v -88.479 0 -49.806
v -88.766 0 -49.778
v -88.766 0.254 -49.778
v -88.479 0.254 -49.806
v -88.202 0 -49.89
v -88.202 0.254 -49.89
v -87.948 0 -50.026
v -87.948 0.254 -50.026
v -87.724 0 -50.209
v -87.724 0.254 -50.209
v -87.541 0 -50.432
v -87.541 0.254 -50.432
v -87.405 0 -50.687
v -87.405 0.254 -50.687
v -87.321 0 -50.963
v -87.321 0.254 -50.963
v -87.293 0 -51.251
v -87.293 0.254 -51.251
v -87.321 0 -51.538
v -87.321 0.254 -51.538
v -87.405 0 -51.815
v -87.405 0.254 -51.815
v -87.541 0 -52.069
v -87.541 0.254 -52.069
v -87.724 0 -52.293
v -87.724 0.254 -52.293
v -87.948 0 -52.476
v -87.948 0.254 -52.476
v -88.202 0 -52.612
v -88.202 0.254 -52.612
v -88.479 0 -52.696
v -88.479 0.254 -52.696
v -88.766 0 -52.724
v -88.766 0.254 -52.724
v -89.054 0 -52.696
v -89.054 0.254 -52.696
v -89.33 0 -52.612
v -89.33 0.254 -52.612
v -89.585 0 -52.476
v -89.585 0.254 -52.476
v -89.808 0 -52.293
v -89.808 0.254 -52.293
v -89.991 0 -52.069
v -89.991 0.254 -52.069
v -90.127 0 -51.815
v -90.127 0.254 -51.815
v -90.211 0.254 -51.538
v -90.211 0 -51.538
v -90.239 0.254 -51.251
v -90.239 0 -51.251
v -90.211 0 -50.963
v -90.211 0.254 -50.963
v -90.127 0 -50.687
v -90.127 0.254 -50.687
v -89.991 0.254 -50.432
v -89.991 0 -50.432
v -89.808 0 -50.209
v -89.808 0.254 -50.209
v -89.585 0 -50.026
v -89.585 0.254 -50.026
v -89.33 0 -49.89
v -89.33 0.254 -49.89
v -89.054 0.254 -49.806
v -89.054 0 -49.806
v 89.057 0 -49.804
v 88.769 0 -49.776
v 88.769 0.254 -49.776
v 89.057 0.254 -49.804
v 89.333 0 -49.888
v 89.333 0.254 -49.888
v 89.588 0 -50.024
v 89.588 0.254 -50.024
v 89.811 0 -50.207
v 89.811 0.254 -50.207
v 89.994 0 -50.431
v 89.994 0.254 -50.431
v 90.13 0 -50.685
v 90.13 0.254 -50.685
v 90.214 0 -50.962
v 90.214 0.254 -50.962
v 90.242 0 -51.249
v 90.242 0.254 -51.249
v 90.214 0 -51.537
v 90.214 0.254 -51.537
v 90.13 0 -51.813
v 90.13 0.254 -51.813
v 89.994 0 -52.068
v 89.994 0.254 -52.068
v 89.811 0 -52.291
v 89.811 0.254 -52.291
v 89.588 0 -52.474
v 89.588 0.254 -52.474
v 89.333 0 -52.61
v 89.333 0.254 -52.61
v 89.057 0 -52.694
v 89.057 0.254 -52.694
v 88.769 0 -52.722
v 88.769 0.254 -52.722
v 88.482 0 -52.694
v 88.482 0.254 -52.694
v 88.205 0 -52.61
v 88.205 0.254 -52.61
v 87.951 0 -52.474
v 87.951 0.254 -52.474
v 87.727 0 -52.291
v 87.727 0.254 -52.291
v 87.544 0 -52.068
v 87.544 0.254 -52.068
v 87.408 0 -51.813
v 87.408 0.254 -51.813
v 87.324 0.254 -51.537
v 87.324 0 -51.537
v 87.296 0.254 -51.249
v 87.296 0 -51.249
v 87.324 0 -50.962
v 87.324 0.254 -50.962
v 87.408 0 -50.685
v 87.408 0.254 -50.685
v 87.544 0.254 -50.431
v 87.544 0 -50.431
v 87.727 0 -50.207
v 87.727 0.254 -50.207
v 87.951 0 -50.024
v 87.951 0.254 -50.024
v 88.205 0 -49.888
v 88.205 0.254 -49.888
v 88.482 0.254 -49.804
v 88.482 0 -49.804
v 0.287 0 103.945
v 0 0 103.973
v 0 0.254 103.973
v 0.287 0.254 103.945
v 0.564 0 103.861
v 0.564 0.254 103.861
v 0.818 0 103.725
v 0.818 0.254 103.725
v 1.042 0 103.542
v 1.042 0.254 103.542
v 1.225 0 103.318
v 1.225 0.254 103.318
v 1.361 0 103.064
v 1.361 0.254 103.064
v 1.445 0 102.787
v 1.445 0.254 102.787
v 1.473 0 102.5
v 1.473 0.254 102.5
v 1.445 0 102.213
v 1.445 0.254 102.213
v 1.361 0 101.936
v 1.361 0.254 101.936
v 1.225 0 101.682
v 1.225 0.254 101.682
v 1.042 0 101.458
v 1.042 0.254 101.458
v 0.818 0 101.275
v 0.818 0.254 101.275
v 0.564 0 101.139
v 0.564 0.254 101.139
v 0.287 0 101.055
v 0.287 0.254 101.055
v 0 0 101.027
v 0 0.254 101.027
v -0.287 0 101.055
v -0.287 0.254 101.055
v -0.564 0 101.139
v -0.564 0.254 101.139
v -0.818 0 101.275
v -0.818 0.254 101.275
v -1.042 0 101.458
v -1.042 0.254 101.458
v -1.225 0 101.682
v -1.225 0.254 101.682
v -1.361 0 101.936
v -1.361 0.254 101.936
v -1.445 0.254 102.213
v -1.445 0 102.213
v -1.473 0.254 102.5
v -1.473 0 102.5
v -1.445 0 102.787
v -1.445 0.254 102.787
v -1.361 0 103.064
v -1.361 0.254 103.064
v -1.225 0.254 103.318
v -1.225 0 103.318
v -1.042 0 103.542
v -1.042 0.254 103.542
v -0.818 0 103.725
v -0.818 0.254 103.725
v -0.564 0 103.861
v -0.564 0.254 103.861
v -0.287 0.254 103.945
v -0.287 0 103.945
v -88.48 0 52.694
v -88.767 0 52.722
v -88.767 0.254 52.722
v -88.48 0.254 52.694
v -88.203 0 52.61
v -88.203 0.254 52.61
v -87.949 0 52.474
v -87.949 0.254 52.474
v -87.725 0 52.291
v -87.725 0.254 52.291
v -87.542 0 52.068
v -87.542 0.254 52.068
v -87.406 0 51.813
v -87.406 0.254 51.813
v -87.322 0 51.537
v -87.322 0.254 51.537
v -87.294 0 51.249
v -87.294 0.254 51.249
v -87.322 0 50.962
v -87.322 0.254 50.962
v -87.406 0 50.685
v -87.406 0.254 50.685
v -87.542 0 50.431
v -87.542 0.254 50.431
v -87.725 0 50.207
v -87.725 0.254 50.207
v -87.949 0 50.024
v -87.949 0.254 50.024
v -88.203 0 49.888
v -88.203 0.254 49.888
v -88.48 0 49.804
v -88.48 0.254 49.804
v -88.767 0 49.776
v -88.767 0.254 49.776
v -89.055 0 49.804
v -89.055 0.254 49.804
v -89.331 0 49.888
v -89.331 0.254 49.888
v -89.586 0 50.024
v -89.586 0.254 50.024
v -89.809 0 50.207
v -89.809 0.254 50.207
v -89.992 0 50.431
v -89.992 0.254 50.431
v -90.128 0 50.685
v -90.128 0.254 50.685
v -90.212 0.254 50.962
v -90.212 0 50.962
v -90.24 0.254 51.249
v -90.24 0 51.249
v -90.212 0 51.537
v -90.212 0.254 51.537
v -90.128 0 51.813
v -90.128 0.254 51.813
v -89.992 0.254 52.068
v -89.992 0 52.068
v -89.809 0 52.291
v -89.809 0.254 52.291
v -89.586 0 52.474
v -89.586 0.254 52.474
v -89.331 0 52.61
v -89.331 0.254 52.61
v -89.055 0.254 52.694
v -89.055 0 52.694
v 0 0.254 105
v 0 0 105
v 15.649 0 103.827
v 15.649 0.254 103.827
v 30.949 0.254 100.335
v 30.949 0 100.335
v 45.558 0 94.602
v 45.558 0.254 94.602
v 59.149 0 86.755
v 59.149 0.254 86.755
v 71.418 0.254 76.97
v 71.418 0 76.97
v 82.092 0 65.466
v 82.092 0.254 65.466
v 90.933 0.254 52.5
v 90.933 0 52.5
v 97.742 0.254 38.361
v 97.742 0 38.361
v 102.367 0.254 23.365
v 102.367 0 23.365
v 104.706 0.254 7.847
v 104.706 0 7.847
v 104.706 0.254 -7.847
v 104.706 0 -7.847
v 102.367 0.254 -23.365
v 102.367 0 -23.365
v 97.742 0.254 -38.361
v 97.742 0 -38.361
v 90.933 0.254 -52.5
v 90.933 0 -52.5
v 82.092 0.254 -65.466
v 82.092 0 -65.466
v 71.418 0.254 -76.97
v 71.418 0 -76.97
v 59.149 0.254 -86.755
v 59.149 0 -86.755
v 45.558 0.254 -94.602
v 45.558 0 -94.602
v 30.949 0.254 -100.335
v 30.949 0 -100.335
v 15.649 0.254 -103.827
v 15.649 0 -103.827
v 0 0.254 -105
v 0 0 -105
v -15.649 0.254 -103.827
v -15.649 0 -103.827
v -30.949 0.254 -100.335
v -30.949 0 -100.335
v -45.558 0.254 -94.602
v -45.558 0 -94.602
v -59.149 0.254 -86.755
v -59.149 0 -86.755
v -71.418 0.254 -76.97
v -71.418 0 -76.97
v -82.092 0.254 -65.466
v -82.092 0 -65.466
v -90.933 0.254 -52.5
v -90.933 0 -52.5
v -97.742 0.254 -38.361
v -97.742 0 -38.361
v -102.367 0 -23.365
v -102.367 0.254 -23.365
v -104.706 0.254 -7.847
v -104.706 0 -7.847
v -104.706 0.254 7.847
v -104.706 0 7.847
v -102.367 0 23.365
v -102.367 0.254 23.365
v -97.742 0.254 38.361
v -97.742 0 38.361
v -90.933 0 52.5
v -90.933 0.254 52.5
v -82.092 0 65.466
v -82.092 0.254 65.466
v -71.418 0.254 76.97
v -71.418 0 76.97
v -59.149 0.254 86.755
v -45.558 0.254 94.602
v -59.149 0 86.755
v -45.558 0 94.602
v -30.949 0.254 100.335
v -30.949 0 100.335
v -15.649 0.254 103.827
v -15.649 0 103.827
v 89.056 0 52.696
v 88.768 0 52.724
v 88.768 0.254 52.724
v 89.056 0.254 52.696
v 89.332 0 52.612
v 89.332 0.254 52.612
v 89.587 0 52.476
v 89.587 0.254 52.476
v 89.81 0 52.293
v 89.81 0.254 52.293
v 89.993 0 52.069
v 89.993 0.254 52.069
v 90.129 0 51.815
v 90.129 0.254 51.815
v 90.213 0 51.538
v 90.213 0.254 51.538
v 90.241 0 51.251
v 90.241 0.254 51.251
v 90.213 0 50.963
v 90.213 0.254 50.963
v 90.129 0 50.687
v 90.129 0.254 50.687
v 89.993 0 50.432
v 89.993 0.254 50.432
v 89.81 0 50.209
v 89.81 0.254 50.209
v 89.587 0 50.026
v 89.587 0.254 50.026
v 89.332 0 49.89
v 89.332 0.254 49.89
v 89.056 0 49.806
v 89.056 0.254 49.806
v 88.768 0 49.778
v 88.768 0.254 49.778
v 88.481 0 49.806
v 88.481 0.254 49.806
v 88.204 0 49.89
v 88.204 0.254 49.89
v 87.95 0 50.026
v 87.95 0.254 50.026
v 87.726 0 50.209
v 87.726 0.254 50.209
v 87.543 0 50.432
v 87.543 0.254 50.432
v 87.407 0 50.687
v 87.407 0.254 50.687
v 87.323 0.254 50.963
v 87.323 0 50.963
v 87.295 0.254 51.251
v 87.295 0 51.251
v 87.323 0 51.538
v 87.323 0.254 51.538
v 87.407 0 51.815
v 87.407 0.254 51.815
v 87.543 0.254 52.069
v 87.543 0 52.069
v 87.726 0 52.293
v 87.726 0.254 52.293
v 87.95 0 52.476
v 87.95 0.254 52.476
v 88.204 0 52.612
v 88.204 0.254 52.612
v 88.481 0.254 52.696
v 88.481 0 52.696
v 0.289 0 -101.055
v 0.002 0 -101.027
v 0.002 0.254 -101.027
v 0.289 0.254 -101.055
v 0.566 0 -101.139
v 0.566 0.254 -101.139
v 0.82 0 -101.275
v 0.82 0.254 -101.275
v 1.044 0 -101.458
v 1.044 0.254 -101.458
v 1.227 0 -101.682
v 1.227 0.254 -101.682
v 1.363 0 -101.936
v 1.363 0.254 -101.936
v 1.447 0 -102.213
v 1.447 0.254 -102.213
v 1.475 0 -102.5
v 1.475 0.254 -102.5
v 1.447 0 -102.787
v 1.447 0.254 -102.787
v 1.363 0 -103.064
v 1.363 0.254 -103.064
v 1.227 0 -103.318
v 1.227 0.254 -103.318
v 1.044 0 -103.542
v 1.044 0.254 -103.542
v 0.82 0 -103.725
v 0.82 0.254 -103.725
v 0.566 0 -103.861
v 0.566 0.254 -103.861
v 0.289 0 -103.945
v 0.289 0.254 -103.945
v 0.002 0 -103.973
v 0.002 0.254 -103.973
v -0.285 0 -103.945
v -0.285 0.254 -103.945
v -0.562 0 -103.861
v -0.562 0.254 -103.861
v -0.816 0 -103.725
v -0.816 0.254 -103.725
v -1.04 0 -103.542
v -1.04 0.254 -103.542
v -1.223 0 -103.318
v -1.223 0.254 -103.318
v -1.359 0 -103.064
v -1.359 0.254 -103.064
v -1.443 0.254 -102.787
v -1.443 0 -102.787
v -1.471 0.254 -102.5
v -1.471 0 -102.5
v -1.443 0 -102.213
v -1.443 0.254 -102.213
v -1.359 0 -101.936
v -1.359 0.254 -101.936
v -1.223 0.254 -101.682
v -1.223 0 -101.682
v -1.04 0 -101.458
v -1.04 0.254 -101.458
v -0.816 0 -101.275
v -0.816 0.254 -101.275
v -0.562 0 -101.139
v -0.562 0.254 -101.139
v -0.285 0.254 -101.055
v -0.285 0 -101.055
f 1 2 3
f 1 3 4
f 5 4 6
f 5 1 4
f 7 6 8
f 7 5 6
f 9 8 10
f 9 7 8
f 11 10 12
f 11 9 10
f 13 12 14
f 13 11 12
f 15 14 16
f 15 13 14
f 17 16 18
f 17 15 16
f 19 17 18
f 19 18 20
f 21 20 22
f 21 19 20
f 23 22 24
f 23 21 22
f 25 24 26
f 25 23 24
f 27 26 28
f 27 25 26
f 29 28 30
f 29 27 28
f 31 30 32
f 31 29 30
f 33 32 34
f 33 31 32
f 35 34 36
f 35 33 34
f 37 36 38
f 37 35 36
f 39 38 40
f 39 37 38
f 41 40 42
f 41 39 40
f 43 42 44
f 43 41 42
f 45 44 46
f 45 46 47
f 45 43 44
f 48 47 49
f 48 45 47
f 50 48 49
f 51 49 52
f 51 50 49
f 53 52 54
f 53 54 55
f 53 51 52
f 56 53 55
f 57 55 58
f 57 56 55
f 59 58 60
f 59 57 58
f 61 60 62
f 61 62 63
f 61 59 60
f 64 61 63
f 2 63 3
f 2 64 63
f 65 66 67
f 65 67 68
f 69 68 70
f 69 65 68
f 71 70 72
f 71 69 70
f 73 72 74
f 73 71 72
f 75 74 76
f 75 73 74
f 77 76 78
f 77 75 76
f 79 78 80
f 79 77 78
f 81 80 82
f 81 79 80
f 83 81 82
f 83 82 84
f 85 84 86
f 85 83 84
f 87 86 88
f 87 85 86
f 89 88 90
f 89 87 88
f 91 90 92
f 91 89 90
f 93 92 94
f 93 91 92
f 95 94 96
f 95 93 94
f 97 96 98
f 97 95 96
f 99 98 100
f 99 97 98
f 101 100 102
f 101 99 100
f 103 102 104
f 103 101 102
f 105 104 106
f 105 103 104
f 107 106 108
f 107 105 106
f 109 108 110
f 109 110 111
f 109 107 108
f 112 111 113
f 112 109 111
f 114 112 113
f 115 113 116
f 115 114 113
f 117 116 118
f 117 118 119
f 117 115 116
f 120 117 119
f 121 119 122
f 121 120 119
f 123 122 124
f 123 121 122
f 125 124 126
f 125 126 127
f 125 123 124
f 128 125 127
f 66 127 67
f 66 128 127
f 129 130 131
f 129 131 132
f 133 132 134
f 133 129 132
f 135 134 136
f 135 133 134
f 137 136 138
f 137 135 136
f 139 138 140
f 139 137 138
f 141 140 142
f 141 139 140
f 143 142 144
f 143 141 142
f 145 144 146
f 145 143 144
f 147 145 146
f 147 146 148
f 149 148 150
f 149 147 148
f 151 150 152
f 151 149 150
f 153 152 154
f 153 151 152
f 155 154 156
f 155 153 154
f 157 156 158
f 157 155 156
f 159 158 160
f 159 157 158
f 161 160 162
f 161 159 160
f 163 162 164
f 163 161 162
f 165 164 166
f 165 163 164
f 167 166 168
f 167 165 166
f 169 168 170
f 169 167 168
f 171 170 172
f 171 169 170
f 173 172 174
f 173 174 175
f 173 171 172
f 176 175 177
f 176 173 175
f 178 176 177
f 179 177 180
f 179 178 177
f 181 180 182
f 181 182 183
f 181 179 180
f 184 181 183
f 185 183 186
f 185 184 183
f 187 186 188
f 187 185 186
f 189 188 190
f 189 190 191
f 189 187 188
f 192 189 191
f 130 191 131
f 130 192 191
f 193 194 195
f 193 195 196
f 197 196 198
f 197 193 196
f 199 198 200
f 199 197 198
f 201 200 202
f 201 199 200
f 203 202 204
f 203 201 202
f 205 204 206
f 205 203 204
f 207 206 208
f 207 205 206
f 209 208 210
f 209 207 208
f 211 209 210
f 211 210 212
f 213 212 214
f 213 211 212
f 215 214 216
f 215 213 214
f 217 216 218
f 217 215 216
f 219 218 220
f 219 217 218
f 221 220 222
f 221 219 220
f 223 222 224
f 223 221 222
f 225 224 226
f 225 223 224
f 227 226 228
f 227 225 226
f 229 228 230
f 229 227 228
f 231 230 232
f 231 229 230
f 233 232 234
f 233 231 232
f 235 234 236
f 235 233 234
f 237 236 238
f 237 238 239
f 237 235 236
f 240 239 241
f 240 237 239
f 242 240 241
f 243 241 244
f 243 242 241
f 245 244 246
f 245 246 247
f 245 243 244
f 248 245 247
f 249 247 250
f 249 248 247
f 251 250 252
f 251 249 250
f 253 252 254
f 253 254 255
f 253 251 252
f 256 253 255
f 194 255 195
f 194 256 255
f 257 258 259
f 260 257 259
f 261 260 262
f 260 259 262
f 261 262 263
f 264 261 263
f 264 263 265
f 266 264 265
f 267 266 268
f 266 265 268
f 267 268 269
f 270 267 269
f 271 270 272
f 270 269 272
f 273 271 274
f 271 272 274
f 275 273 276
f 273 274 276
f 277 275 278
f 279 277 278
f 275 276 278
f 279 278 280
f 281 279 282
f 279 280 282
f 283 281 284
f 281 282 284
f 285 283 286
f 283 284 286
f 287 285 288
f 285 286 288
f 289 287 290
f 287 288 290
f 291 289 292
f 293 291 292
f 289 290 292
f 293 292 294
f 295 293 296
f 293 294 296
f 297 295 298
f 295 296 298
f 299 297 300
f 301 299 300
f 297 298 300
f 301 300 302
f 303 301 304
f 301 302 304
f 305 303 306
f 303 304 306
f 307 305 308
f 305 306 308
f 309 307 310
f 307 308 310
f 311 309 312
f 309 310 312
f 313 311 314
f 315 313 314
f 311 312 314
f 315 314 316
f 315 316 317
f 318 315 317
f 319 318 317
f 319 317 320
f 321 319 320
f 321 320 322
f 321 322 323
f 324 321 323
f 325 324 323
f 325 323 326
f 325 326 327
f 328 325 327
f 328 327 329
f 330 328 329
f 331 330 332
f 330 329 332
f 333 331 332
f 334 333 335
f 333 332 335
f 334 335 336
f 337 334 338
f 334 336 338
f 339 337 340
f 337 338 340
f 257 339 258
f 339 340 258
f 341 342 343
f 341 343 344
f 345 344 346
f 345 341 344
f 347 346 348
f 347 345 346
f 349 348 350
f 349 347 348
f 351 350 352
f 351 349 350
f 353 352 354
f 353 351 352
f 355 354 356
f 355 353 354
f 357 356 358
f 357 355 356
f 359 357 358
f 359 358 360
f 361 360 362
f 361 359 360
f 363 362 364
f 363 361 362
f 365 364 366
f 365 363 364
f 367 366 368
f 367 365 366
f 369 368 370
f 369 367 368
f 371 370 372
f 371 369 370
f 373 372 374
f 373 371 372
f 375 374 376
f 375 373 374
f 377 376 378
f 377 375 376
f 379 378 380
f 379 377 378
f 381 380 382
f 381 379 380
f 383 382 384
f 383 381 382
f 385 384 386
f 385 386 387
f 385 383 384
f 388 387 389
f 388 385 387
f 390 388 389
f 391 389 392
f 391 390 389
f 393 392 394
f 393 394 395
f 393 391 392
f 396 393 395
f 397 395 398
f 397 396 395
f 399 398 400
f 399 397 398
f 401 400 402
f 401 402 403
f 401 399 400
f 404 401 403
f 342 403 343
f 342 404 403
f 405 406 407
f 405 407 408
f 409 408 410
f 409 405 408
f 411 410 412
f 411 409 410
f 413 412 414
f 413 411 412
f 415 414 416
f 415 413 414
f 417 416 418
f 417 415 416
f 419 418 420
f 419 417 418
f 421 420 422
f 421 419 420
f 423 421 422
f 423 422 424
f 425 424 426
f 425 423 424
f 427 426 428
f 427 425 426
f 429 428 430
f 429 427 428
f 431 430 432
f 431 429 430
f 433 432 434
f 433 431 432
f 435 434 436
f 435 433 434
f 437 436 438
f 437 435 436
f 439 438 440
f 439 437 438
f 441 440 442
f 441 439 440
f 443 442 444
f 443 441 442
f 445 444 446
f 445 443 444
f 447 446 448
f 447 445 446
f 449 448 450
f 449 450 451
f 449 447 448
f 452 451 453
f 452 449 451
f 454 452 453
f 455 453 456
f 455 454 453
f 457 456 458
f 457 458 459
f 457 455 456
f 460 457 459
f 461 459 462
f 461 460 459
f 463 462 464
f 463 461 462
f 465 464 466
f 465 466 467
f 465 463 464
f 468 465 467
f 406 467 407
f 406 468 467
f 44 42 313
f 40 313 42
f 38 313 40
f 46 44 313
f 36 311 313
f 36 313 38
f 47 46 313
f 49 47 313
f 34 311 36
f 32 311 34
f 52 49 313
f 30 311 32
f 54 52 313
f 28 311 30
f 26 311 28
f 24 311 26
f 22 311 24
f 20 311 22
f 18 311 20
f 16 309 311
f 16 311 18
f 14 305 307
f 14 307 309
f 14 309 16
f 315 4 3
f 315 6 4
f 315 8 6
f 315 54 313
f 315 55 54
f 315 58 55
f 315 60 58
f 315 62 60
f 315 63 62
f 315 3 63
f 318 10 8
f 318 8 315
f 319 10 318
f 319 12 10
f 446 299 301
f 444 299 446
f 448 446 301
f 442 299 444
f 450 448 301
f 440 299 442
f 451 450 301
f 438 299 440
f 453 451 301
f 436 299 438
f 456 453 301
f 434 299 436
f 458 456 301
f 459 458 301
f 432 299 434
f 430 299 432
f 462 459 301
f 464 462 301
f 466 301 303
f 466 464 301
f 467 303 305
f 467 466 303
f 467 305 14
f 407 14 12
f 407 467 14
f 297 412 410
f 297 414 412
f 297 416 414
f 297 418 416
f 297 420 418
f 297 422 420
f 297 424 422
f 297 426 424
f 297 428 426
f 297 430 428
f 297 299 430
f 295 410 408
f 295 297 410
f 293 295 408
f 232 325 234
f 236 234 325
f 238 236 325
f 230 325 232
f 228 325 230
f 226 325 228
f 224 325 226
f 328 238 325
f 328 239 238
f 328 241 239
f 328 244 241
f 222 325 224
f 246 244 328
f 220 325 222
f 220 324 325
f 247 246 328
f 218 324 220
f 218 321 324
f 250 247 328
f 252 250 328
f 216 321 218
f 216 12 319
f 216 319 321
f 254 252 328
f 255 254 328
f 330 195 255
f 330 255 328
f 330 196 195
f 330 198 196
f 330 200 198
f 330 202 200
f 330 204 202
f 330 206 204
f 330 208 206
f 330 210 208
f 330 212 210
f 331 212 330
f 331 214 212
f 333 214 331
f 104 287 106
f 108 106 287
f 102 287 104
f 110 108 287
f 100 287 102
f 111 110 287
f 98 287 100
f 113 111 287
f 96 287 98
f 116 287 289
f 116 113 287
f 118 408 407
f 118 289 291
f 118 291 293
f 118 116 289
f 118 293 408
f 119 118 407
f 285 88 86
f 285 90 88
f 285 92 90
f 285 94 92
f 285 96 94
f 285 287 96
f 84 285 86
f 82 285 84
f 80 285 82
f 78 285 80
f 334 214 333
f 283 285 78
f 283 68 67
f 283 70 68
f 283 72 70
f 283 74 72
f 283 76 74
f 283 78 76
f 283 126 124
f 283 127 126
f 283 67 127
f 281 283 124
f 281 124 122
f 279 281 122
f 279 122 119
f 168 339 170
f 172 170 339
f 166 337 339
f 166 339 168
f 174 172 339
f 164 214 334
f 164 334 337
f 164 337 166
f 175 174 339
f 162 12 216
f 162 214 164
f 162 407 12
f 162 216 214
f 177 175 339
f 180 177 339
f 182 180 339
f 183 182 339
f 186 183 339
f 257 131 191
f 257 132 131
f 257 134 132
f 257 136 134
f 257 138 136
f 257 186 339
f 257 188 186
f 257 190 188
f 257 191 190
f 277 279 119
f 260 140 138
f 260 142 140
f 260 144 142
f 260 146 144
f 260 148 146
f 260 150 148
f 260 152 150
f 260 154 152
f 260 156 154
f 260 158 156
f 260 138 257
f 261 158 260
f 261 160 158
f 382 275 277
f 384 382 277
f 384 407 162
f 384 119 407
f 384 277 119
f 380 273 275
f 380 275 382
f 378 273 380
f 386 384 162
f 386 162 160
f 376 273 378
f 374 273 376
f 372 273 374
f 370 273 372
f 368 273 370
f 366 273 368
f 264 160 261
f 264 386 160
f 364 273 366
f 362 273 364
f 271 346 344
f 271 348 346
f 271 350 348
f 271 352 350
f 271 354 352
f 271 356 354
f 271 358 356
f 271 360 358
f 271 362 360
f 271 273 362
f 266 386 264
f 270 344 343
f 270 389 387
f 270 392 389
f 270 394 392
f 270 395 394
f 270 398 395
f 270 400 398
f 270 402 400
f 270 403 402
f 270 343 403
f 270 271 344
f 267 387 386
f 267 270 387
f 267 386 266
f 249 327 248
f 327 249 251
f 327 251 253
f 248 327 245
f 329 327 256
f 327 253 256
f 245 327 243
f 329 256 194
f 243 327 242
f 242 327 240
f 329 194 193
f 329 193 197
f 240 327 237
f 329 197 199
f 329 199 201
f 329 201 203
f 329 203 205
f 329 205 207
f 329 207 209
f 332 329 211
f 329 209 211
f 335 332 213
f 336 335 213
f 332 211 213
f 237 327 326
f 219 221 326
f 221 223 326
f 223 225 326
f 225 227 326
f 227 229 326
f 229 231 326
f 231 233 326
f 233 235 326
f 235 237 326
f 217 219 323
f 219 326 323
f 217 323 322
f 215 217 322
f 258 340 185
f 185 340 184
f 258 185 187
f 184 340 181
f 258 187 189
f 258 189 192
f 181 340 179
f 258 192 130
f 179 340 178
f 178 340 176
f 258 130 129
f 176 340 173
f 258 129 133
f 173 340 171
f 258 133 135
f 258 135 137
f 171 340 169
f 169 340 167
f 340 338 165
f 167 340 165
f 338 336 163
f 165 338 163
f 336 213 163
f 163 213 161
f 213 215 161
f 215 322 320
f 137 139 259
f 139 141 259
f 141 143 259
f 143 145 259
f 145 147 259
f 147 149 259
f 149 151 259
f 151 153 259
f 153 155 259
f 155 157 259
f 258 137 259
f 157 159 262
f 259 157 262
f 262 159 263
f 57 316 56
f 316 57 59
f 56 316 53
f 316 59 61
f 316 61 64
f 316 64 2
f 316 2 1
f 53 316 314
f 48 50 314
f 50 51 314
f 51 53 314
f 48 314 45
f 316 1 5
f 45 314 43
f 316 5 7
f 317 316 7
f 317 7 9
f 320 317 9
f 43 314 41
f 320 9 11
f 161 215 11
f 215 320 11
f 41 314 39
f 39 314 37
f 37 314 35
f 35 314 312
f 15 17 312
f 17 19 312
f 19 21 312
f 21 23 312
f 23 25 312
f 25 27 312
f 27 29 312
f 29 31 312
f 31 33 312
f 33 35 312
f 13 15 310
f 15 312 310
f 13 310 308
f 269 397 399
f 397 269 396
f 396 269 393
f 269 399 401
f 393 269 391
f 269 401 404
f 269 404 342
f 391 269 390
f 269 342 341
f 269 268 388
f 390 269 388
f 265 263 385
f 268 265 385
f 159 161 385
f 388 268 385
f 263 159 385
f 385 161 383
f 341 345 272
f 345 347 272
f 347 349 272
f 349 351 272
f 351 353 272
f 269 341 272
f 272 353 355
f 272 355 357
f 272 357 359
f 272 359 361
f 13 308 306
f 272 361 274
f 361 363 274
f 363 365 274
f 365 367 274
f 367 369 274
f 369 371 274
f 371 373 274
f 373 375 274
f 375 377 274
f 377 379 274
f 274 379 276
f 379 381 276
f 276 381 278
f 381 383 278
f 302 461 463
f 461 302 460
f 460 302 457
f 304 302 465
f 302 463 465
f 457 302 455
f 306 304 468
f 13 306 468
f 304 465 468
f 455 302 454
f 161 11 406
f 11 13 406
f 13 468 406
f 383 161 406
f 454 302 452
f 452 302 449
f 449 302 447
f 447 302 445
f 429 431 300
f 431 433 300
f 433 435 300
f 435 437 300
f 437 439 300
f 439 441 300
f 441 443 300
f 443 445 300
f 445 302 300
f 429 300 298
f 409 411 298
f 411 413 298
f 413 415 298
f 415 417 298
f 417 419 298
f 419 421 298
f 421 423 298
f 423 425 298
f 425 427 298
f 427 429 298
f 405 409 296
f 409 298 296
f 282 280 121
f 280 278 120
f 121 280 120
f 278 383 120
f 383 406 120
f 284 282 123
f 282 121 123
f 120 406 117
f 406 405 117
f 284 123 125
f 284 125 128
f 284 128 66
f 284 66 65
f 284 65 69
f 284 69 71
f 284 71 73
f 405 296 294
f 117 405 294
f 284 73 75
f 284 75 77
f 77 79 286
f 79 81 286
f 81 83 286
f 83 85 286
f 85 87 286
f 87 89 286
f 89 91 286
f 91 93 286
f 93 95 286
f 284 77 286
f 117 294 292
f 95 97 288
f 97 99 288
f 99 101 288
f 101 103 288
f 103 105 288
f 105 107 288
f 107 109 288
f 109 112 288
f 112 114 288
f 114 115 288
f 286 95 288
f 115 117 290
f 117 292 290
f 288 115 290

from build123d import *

# Parameters (mm, degrees)
SKETCH1_R           = 105
SKETCH1_R_2         = 1.4732
SKETCH1_R_3         = 100
BOSS_EXTRUDE1_DEPTH = 0.254


with BuildPart() as part:
    # Sketch1 → Boss-Extrude1 (new body)
    # profile 1 of 2: a face of its own
    with BuildSketch(Plane(origin=(0, 0, 0), x_dir=(1, 0, 0), z_dir=(0, 1, 0))):
        with Locations(Location((0, 0, 0), (0, 0, 270))):
            Circle(SKETCH1_R)
        with Locations(Location((88.768103888, -51.250866025, 0), (0, 0, 270))):
            Circle(SKETCH1_R_2, mode=Mode.SUBTRACT)
        with Locations(Location((88.769103888, 51.249133975, 0), (0, 0, 270))):
            Circle(SKETCH1_R_2, mode=Mode.SUBTRACT)
        with Locations(Location((0.002, 102.5, 0), (0, 0, 270))):
            Circle(SKETCH1_R_2, mode=Mode.SUBTRACT)
        with Locations(Location((-88.766103888, 51.250866025, 0), (0, 0, 270))):
            Circle(SKETCH1_R_2, mode=Mode.SUBTRACT)
        with Locations(Location((-88.767103888, -51.249133975, 0), (0, 0, 270))):
            Circle(SKETCH1_R_2, mode=Mode.SUBTRACT)
        with Locations(Location((0, -102.5, 0), (0, 0, 270))):
            Circle(SKETCH1_R_2, mode=Mode.SUBTRACT)
        Circle(SKETCH1_R_3, mode=Mode.SUBTRACT)
    # profile 2 of 2: a face of its own
    with BuildSketch(Plane(origin=(0, 0, 0), x_dir=(1, 0, 0), z_dir=(0, 1, 0))):
        Circle(SKETCH1_R_3)
    extrude(amount=BOSS_EXTRUDE1_DEPTH)


solid = part.part
